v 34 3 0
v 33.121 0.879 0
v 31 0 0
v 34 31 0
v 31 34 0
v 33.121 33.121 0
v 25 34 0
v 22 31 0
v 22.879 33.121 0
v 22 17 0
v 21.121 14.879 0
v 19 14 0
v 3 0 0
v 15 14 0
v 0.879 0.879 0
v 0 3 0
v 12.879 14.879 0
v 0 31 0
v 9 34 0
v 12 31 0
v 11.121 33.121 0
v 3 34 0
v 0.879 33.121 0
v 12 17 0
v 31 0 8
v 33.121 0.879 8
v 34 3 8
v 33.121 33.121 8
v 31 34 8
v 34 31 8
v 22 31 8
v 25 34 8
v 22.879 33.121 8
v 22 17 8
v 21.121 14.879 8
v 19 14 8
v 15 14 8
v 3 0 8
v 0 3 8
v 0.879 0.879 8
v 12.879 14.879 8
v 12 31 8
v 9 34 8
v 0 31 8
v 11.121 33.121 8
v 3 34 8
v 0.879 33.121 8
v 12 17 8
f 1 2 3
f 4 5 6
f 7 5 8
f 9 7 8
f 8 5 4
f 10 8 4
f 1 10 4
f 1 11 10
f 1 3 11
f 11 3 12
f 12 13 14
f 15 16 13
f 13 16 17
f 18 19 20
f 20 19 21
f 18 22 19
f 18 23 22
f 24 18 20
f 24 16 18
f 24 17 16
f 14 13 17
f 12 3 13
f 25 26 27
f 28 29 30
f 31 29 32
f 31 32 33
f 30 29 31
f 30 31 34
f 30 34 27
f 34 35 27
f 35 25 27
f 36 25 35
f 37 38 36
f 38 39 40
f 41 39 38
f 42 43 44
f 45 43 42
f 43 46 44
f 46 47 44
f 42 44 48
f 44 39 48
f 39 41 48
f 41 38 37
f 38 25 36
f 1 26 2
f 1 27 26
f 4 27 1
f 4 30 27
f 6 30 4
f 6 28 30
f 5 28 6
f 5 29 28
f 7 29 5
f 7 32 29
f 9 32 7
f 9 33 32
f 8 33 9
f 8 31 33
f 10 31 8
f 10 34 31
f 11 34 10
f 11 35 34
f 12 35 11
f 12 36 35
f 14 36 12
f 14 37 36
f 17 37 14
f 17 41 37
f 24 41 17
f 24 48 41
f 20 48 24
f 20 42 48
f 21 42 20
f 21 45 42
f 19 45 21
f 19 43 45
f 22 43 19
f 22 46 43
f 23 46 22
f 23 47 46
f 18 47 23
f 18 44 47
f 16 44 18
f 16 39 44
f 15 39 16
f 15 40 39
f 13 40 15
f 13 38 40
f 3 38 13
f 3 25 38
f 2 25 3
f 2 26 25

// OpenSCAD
$fn = 32;

// ----------------------------------------------------------------------
// Eye lug: clevis, 8 mm thick
// ----------------------------------------------------------------------

// --- parameters (mm) ---
profile_height = 8;       // extrusion height
profile_points = 24;      // points of the closed outline

profile = [[0, 3], [0.879, 0.879], [3, 0], [31, 0], [33.121, 0.879], [34, 3], [34, 31], [33.121, 33.121], [31, 34], [25, 34], [22.879, 33.121], [22, 31], [22, 17], [21.121, 14.879], [19, 14], [15, 14], [12.879, 14.879], [12, 17], [12, 31], [11.121, 33.121], [9, 34], [3, 34], [0.879, 33.121], [0, 31]];  // single closed polygon, 24 points, counter clockwise

// --- the one profile operation ---
linear_extrude(height = profile_height) polygon(points = profile);
